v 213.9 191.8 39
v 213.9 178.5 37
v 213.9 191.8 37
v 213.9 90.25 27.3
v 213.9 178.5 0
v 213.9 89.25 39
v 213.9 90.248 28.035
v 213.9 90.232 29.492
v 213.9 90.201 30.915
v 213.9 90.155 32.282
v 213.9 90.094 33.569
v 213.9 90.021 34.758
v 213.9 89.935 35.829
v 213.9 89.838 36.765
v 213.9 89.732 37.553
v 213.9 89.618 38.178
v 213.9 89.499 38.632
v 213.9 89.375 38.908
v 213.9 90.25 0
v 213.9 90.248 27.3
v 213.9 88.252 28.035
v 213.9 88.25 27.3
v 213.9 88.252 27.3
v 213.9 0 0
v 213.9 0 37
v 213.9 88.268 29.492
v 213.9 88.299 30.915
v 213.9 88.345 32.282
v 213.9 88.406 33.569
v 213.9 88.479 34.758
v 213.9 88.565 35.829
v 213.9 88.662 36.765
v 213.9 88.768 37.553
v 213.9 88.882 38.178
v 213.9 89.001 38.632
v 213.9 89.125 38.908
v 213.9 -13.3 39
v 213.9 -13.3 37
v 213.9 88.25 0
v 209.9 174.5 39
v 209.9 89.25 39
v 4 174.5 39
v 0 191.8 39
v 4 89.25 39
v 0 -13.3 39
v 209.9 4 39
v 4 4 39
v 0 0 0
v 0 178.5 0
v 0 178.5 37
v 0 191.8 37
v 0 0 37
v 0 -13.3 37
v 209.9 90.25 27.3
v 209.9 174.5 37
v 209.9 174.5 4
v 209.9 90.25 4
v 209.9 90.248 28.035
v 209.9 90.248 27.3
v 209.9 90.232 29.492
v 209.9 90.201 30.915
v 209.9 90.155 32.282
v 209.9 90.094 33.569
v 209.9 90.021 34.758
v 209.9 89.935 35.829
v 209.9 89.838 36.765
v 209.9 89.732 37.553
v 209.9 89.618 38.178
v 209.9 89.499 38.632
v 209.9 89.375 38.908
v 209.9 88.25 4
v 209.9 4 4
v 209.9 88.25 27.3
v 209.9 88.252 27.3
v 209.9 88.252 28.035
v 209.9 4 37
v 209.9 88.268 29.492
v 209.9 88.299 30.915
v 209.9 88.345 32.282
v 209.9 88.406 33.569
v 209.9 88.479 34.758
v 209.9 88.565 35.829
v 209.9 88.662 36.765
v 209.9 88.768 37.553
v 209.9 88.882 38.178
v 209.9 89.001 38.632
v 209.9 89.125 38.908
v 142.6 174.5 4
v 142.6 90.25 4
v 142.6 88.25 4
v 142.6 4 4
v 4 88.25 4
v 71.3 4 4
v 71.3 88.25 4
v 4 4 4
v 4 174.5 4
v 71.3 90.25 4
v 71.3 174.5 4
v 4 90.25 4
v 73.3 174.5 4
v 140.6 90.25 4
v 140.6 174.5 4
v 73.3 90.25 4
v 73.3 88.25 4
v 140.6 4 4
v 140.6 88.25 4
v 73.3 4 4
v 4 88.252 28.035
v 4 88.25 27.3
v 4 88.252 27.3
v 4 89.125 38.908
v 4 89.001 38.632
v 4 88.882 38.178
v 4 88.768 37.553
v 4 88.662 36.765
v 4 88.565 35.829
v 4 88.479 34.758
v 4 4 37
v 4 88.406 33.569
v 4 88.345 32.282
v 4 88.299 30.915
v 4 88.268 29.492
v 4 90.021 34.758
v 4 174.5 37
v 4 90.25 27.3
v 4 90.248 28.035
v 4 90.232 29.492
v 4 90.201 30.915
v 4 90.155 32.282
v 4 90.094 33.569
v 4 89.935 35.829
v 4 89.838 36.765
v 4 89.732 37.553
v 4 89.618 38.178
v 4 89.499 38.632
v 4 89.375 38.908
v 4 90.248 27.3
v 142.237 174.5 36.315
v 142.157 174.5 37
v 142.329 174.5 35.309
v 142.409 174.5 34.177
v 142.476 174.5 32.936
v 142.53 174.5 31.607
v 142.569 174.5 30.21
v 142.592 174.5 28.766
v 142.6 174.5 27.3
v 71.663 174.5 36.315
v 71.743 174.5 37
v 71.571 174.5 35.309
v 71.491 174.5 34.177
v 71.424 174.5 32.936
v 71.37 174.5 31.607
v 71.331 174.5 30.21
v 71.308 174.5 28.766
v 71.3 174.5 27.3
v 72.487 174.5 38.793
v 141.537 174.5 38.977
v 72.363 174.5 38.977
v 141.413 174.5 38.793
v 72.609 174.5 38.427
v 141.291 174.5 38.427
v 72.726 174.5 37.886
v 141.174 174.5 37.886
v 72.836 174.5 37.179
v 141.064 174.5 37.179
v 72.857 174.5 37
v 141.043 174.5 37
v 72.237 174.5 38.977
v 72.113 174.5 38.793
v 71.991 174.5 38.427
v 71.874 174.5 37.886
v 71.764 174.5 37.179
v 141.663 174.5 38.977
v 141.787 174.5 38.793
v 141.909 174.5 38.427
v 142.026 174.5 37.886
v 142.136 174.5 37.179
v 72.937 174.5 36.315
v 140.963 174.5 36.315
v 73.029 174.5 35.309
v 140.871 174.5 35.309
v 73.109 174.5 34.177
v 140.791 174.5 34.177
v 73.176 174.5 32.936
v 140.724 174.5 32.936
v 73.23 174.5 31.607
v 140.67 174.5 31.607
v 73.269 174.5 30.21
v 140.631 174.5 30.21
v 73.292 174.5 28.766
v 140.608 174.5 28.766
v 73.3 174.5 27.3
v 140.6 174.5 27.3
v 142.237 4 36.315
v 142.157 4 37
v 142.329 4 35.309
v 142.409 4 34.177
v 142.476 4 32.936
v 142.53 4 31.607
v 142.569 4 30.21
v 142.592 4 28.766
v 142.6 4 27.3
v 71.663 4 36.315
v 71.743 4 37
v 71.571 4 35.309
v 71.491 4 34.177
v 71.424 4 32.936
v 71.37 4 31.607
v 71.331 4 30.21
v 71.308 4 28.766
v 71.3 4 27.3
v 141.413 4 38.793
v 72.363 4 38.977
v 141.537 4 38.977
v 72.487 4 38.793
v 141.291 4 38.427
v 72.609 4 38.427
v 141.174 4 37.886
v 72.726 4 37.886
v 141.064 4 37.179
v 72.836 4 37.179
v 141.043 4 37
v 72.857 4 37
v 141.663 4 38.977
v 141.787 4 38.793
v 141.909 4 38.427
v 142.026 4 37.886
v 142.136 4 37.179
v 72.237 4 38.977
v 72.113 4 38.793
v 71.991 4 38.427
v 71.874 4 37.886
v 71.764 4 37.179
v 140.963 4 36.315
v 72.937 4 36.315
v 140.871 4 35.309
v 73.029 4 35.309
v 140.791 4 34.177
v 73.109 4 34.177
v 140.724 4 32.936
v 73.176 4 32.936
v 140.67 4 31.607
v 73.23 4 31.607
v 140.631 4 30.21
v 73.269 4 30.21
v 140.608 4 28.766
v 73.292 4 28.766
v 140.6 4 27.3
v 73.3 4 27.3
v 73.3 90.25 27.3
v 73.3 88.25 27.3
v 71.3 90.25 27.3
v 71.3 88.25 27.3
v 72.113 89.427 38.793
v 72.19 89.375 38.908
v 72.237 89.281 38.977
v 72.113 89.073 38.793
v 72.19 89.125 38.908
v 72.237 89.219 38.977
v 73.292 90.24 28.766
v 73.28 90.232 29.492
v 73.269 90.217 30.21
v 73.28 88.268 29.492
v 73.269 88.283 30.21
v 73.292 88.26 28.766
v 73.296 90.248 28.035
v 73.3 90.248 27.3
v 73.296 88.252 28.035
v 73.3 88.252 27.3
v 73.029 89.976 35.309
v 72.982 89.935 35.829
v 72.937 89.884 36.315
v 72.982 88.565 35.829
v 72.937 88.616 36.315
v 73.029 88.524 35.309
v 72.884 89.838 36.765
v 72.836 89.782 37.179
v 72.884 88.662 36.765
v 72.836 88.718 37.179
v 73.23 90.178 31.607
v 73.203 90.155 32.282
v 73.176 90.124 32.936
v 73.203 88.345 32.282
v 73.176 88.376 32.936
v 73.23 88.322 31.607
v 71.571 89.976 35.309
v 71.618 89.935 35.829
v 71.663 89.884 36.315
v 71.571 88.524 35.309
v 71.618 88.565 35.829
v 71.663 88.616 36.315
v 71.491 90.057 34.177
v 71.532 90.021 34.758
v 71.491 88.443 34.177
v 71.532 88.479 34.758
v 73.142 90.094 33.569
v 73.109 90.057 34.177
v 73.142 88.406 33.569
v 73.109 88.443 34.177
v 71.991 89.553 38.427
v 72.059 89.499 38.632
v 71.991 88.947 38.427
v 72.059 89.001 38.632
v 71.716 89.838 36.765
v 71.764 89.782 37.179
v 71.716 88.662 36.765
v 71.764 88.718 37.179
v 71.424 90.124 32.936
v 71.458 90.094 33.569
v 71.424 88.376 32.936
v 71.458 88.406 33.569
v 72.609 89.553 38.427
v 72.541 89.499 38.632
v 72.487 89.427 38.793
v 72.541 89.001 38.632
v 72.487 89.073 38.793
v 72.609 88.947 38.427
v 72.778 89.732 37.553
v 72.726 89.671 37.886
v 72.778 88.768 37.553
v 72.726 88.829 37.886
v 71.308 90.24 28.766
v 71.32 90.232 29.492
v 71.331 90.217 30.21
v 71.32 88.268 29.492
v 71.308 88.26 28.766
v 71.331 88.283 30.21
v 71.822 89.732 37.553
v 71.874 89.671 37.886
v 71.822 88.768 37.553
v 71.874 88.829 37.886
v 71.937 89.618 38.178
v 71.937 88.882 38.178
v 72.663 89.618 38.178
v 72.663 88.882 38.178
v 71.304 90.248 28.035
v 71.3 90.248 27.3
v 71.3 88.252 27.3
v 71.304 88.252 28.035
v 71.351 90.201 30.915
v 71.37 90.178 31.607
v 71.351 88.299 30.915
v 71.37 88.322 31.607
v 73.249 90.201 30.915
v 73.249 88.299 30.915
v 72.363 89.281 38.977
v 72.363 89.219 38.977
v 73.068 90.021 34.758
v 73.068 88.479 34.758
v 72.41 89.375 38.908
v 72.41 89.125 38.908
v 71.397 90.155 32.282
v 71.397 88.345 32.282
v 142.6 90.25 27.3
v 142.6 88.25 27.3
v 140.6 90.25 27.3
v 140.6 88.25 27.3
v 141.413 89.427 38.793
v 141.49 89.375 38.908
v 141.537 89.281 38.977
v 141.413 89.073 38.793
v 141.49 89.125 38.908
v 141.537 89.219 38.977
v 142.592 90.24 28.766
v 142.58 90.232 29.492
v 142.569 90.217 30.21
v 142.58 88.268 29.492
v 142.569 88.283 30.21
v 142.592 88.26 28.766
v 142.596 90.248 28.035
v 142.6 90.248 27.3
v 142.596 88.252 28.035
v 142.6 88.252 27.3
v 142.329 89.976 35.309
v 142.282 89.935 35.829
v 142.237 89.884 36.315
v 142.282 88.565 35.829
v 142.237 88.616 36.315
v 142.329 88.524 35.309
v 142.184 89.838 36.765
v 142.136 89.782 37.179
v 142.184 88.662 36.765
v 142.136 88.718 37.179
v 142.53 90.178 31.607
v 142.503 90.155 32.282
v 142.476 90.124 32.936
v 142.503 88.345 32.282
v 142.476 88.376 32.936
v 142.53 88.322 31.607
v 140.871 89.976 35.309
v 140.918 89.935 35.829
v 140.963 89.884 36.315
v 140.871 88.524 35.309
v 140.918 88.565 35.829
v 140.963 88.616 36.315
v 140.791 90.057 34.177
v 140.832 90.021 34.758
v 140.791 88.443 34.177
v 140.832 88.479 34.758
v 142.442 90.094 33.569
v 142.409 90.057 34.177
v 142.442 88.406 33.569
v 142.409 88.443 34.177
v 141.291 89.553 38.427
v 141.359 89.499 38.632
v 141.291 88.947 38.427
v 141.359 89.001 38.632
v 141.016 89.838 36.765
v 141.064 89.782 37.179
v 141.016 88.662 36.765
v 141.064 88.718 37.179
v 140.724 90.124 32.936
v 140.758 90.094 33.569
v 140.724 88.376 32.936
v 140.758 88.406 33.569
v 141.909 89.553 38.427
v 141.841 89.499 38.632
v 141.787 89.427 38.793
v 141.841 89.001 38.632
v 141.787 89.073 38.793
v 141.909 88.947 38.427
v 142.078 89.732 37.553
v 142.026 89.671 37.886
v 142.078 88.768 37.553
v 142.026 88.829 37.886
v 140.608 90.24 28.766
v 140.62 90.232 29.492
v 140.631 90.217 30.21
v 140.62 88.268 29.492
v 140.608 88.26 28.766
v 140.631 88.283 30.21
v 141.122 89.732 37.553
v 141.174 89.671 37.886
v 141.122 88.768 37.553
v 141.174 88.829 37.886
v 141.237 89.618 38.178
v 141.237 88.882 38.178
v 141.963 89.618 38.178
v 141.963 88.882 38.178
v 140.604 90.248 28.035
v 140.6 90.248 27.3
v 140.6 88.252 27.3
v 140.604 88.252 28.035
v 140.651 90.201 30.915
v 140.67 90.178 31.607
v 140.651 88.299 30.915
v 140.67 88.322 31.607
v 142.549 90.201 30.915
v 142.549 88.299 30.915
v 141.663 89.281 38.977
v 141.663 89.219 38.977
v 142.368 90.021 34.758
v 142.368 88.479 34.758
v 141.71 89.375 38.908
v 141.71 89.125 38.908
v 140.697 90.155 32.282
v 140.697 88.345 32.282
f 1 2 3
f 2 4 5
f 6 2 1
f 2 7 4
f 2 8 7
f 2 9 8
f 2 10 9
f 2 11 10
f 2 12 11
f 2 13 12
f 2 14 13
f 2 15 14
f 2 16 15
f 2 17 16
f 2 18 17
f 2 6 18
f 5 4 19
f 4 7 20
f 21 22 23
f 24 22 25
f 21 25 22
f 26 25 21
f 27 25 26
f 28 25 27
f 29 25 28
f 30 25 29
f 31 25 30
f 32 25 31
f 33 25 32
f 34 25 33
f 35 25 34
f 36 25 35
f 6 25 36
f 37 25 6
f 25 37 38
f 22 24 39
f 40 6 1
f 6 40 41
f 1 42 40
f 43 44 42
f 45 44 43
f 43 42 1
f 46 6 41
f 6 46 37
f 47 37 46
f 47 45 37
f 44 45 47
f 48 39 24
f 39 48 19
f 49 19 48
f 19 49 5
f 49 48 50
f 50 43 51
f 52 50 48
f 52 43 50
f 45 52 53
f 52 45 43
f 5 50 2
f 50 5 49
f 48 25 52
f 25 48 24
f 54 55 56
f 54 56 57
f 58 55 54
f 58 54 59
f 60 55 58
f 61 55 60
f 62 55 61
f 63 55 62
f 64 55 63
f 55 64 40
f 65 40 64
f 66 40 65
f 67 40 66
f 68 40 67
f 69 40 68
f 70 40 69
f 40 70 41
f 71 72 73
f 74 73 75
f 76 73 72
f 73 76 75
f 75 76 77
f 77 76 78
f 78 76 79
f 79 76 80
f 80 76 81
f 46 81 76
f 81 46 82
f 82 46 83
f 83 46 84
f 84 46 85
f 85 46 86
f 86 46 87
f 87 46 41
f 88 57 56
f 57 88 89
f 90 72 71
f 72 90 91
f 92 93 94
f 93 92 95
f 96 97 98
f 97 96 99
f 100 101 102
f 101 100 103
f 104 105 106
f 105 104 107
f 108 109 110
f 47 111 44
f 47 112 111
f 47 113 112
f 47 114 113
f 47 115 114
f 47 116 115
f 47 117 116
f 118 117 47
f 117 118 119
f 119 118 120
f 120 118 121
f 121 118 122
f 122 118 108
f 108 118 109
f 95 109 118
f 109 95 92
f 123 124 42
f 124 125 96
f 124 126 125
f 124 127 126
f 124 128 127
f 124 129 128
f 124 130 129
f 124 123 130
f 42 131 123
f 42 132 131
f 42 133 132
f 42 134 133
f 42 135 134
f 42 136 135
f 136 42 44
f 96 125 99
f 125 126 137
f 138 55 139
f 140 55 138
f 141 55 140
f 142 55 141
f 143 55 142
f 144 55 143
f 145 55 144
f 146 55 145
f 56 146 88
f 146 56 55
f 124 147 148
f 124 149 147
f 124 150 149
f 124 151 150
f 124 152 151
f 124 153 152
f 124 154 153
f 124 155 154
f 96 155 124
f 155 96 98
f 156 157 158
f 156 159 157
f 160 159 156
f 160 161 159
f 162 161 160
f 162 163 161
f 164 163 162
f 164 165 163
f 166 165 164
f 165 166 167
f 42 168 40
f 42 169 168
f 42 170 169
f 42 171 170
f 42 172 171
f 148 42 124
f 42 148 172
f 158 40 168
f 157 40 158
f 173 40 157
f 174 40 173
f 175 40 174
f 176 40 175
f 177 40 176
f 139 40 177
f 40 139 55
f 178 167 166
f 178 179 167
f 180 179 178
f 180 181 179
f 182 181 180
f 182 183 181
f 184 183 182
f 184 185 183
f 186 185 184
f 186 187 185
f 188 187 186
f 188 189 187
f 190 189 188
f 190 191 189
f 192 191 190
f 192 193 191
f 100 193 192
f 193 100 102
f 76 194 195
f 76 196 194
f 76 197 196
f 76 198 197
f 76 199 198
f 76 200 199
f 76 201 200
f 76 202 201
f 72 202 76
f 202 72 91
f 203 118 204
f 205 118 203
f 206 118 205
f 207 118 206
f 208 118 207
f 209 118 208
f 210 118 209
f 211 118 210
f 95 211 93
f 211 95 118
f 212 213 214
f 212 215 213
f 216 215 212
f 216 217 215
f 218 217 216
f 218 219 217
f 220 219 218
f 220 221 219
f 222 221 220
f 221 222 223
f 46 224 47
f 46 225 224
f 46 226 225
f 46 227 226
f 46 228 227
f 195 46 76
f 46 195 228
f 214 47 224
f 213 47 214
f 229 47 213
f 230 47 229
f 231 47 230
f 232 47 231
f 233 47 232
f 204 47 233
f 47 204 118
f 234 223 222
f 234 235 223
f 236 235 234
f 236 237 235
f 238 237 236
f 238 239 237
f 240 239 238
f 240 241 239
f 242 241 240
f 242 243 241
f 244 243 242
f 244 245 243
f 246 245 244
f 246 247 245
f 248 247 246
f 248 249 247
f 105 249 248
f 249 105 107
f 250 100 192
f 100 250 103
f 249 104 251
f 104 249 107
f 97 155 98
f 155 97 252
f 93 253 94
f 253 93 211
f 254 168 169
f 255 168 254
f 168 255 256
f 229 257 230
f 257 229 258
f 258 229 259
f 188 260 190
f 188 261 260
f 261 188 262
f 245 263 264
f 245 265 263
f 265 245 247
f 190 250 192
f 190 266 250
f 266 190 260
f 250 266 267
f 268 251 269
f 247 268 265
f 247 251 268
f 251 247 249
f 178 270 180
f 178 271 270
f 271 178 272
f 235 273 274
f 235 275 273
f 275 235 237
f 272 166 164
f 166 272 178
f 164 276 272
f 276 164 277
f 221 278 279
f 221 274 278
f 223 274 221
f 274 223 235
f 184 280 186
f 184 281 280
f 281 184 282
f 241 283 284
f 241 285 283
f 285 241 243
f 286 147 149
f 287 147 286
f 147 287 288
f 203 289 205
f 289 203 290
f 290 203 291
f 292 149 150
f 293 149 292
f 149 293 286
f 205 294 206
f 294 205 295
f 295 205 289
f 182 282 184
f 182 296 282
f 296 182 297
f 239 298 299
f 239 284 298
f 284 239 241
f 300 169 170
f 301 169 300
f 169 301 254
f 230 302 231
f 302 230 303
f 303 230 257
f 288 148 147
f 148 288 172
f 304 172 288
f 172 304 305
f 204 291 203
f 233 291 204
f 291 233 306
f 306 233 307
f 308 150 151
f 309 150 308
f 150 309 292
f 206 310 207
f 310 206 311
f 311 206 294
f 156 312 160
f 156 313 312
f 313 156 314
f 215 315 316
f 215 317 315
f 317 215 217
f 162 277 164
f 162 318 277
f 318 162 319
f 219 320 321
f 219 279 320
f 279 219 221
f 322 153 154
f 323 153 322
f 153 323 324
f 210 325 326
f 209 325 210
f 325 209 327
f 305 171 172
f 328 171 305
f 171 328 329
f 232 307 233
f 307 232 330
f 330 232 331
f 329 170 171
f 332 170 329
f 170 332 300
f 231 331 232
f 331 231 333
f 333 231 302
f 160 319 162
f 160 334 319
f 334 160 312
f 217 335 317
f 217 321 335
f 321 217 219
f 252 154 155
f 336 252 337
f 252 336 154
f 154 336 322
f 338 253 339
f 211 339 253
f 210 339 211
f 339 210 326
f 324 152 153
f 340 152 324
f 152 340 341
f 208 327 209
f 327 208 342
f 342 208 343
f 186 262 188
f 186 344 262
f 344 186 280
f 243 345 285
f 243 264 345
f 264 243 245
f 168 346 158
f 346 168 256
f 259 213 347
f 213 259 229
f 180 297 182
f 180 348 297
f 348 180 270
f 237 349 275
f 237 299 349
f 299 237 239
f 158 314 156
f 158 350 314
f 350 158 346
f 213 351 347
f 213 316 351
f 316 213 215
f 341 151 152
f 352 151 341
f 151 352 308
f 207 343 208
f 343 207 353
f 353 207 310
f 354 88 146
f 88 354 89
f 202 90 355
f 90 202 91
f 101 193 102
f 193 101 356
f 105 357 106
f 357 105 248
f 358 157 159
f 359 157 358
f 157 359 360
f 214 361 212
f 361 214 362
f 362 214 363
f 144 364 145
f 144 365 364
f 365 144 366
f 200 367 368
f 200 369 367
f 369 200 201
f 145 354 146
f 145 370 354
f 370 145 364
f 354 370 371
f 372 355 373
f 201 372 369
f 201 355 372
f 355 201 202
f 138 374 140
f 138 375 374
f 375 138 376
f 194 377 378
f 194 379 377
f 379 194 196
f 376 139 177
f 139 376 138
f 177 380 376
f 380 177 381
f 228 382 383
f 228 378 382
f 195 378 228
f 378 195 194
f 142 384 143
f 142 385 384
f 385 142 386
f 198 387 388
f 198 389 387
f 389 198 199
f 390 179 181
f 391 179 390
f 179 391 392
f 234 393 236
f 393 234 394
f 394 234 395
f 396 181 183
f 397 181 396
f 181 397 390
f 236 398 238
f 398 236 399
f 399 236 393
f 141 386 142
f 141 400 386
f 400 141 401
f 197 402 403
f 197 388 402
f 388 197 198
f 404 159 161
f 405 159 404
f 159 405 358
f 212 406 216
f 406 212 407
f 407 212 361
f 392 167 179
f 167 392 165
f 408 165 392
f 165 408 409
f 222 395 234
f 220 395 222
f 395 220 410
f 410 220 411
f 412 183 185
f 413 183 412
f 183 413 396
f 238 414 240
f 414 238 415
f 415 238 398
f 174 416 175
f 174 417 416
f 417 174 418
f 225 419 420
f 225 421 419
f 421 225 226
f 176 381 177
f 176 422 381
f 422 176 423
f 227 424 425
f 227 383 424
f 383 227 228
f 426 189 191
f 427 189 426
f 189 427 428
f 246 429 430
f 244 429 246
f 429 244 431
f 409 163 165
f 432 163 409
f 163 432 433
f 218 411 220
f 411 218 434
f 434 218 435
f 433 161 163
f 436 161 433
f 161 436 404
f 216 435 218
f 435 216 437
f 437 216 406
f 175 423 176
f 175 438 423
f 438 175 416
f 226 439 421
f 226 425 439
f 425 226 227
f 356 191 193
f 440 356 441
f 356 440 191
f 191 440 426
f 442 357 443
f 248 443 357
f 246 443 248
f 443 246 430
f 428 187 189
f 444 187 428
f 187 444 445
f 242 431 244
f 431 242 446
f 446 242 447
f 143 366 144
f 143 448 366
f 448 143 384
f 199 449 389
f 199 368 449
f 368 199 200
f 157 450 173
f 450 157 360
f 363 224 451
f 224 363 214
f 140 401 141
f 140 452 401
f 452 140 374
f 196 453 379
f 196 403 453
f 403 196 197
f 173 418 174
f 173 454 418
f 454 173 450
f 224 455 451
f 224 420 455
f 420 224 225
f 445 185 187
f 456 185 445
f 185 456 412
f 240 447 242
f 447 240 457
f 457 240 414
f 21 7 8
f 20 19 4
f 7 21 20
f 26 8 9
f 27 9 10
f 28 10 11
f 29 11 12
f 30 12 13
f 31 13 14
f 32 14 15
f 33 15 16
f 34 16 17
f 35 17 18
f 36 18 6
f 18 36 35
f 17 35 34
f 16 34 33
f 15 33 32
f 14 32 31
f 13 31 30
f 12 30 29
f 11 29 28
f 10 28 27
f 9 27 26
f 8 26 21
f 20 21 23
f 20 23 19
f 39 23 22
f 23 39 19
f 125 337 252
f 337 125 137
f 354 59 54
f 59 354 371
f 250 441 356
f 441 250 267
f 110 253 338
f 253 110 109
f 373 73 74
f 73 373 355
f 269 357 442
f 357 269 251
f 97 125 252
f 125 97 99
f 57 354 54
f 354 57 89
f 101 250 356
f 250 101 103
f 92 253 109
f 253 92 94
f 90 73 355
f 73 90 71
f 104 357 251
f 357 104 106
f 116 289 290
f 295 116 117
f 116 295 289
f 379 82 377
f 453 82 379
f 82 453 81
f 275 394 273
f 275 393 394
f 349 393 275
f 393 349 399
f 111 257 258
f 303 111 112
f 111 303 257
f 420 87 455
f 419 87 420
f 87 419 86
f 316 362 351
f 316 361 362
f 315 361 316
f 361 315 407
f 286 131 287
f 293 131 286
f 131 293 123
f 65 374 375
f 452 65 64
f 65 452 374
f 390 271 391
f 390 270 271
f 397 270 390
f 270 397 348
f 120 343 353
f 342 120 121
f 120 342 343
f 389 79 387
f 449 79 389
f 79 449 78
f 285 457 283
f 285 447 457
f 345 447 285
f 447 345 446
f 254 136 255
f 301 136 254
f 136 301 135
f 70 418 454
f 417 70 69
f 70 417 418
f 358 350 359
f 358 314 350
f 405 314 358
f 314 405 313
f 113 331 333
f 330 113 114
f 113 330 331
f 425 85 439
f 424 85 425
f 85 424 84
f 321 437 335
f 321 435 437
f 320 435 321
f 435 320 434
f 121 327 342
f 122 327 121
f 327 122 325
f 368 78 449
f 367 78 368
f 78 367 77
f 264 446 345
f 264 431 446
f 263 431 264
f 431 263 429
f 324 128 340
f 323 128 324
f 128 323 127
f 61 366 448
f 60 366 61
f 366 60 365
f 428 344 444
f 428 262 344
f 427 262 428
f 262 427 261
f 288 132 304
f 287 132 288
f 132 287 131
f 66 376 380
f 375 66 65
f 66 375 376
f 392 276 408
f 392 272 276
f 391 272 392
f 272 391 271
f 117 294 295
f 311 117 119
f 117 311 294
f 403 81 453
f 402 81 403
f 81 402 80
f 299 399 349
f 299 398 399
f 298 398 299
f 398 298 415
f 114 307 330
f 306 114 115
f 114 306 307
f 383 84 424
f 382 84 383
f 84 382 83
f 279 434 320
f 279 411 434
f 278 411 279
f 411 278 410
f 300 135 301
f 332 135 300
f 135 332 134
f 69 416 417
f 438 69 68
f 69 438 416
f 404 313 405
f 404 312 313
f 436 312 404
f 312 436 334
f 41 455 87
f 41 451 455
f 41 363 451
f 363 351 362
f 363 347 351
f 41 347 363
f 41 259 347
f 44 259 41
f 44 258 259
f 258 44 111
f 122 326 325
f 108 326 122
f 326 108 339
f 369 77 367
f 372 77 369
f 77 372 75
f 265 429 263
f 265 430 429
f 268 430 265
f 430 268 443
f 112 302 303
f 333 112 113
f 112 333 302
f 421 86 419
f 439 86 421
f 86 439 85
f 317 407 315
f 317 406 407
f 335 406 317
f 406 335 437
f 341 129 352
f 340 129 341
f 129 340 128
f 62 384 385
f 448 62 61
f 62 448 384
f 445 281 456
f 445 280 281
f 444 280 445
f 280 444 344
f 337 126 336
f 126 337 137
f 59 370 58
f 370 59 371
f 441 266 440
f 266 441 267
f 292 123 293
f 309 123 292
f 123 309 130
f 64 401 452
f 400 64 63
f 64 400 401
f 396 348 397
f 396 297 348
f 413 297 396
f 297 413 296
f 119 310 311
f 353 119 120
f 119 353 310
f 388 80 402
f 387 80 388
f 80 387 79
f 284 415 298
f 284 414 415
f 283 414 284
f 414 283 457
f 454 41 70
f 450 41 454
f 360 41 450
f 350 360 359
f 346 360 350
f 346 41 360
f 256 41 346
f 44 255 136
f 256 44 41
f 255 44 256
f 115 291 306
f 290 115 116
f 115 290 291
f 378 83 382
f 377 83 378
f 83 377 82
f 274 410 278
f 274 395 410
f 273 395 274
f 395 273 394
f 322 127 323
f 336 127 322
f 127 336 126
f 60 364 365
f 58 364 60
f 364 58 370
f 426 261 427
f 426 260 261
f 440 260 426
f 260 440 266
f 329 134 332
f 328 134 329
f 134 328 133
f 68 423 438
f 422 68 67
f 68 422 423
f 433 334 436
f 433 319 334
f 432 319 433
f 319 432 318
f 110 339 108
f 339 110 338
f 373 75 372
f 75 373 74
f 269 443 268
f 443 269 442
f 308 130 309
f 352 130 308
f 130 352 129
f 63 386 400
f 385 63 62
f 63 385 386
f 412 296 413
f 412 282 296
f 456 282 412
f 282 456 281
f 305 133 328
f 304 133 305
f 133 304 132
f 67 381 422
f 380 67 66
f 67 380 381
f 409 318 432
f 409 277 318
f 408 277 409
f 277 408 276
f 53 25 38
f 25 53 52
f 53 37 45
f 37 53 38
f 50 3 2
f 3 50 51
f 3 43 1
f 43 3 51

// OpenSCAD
// External depth of insert tray
depth  = 178.5;             // [150:0.5:200]
// Height of insert tray below the lip
height = 39;                // [30:0.5:50]
// Width of each cubby
cubby_width = 67.3;         // [47.3:0.25:87.3]
// Thickness of exterior walls and floor
wall_thickness = 4;         // [1:4]
// Thickness of interior walls
int_wall_thickness = 2;     // [1:4]
// Height of interior walls
int_wall_height = height;   // [0:0.5:50]
// Depth over overhang
overhang_depth  = 13.3;     // [10:0.1:15]
// Height of overhang lip, set to 0 for no lip 
overhang_lip = 0;           //[0:0.1:15]
// Thickness of overhang and lip
overhang_thickness = 2;     // [1:0.1:4]
// Number of cubby columns
cubby_cols = 3;             // [1:1:10]
length = cubby_cols*cubby_width + (cubby_cols-1)*int_wall_thickness + 2*wall_thickness;

module overhang(){
    cube([length, overhang_depth + wall_thickness, overhang_thickness]);
    if(overhang_lip > 0){
        translate([0,overhang_depth + wall_thickness, 0.001-overhang_lip]){
            cube([length, overhang_thickness, overhang_lip]);
        }
        translate([length,overhang_depth+wall_thickness,0]){
            rotate([0,-90,0]){
                intersection(){
                    cube([overhang_thickness, overhang_thickness, length]);
                    cylinder(r=overhang_thickness,h=length,$fn=50);
                }
            }
        }
    }
}

bevel_h = 0.3;
module intwall(x,y,z){
    scale([x,y,z]){
        union(){
            cube([1,1,1-bevel_h]);
            translate([y > x ? 0.5 : 0,
                       x > y ? 0.5 : 1,
                       1-bevel_h]){
                scale([1/( (y > x) ? (2*bevel_h) : 1),
                        1/( (x > y) ? (2*bevel_h) : 1),
                        1]){
                    rotate([(y > x) ? 90 : 0, (x > y) ? 90 : 0,0]){
                        cylinder(r=bevel_h,h=1,$fn=50);
                    }
                }
            }
        }
    }
}

union(){
    difference(){
        cube([length, depth, height]);
        translate([wall_thickness, wall_thickness, wall_thickness]){
            cube([length - (2*wall_thickness), 
                  depth - (2*wall_thickness),
                  height]);
        }
        
    }
    for(offset = [wall_thickness + cubby_width:cubby_width + int_wall_thickness:length-wall_thickness - 1]){
        translate([offset, 0, 0]){
            intwall(int_wall_thickness, depth, int_wall_height);
        }
    }
    translate([0,(depth - int_wall_thickness)/2, 0]){
        intwall(length, int_wall_thickness, int_wall_height);
    }
    
    translate([0, wall_thickness, height - overhang_thickness]){
        mirror([0,1,0]){
            overhang();
        }
    }

    translate([0,depth - wall_thickness, height - overhang_thickness]){
        overhang();
    }
}
